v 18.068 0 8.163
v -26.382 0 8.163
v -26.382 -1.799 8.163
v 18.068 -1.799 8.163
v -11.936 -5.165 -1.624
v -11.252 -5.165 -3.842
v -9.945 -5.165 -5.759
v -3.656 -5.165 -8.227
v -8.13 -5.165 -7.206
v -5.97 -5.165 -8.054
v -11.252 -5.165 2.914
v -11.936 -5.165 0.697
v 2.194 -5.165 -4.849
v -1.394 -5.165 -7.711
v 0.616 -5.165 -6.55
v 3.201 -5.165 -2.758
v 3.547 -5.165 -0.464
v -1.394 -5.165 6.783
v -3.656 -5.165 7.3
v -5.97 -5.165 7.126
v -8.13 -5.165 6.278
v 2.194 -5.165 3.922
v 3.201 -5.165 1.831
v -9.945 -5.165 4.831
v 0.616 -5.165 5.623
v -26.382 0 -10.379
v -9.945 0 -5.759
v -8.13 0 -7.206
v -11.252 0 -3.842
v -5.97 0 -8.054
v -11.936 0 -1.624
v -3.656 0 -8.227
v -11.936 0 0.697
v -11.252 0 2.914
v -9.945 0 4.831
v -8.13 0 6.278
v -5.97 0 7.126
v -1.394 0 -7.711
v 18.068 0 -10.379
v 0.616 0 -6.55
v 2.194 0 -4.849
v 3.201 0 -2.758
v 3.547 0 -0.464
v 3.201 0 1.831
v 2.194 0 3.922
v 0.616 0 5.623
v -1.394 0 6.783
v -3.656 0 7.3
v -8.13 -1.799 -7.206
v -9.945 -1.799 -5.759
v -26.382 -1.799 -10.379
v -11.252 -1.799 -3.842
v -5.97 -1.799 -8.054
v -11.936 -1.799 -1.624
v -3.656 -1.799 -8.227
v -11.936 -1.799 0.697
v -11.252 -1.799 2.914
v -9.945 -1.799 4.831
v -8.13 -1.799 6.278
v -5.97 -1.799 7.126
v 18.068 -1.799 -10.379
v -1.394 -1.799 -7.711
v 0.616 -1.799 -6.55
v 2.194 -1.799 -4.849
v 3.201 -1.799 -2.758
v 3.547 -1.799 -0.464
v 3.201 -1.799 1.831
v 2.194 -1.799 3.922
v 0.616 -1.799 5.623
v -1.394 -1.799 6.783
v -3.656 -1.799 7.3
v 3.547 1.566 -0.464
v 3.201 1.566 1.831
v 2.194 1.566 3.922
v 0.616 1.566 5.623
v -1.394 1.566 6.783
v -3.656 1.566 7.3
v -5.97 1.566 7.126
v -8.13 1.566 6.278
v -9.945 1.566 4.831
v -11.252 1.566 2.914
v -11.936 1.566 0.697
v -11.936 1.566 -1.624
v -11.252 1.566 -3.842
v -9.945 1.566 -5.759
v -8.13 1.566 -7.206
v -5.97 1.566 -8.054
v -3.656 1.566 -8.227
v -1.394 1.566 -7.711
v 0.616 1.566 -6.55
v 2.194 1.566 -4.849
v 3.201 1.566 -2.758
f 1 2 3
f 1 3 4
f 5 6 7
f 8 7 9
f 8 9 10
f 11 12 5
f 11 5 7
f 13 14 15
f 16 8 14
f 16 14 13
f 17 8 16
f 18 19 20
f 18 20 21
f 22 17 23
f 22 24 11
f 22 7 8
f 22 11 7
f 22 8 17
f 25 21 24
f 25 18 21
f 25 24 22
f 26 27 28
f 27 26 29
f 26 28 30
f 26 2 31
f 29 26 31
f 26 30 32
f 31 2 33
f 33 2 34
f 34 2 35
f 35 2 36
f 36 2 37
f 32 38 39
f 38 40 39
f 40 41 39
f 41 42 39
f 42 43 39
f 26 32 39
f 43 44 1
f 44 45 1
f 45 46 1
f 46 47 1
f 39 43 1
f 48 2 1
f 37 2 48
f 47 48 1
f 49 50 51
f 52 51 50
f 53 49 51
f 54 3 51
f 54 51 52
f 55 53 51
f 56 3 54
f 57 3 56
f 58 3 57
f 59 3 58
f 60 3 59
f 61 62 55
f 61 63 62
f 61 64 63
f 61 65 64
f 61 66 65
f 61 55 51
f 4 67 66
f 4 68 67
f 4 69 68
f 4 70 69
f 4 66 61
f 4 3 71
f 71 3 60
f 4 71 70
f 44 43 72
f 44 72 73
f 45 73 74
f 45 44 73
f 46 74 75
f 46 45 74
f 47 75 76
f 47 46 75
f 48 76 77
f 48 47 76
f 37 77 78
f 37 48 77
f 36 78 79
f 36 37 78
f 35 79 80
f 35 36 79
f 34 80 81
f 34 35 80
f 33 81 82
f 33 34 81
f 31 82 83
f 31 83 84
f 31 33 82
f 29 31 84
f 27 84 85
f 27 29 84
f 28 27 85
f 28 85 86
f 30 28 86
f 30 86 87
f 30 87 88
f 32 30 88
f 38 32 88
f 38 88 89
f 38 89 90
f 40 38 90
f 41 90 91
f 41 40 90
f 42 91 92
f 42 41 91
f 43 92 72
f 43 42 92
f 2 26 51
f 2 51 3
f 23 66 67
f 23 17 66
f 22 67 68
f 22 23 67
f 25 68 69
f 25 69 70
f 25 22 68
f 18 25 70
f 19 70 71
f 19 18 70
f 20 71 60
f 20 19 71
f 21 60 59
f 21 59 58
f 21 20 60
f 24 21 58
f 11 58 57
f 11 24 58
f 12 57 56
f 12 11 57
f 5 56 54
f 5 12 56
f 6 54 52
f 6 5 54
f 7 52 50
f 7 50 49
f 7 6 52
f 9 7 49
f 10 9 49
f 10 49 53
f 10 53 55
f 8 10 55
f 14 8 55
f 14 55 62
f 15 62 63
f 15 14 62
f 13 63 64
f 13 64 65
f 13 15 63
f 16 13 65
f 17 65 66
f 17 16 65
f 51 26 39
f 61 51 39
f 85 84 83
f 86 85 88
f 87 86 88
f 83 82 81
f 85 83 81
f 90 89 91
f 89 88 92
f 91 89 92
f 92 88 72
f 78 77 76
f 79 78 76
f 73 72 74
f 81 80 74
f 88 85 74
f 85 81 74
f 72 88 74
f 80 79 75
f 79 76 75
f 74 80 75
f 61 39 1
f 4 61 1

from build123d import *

# Parameters (mm, degrees)
F0_W     = 44.45
F0_H     = 18.542
F1_DEPTH = 1.79912
F2_R     = 7.7851
F3_DEPTH = 3.3655


with BuildPart() as f1:
    # F0 (on Front) → F1 (new body)
    with BuildSketch(Plane.XZ):
        with Locations((-4.156615, -1.108171)):
            Rectangle(F0_W, F0_H)
    extrude(amount=F1_DEPTH)

    # F2 (on face) → F3 (join, symmetric)
    with BuildSketch(Plane.XZ.offset(1.79912)):
        with Locations((-4.23788, -0.463784)):
            Circle(F2_R)
    extrude(amount=F3_DEPTH, both=True)


solid = f1.part
